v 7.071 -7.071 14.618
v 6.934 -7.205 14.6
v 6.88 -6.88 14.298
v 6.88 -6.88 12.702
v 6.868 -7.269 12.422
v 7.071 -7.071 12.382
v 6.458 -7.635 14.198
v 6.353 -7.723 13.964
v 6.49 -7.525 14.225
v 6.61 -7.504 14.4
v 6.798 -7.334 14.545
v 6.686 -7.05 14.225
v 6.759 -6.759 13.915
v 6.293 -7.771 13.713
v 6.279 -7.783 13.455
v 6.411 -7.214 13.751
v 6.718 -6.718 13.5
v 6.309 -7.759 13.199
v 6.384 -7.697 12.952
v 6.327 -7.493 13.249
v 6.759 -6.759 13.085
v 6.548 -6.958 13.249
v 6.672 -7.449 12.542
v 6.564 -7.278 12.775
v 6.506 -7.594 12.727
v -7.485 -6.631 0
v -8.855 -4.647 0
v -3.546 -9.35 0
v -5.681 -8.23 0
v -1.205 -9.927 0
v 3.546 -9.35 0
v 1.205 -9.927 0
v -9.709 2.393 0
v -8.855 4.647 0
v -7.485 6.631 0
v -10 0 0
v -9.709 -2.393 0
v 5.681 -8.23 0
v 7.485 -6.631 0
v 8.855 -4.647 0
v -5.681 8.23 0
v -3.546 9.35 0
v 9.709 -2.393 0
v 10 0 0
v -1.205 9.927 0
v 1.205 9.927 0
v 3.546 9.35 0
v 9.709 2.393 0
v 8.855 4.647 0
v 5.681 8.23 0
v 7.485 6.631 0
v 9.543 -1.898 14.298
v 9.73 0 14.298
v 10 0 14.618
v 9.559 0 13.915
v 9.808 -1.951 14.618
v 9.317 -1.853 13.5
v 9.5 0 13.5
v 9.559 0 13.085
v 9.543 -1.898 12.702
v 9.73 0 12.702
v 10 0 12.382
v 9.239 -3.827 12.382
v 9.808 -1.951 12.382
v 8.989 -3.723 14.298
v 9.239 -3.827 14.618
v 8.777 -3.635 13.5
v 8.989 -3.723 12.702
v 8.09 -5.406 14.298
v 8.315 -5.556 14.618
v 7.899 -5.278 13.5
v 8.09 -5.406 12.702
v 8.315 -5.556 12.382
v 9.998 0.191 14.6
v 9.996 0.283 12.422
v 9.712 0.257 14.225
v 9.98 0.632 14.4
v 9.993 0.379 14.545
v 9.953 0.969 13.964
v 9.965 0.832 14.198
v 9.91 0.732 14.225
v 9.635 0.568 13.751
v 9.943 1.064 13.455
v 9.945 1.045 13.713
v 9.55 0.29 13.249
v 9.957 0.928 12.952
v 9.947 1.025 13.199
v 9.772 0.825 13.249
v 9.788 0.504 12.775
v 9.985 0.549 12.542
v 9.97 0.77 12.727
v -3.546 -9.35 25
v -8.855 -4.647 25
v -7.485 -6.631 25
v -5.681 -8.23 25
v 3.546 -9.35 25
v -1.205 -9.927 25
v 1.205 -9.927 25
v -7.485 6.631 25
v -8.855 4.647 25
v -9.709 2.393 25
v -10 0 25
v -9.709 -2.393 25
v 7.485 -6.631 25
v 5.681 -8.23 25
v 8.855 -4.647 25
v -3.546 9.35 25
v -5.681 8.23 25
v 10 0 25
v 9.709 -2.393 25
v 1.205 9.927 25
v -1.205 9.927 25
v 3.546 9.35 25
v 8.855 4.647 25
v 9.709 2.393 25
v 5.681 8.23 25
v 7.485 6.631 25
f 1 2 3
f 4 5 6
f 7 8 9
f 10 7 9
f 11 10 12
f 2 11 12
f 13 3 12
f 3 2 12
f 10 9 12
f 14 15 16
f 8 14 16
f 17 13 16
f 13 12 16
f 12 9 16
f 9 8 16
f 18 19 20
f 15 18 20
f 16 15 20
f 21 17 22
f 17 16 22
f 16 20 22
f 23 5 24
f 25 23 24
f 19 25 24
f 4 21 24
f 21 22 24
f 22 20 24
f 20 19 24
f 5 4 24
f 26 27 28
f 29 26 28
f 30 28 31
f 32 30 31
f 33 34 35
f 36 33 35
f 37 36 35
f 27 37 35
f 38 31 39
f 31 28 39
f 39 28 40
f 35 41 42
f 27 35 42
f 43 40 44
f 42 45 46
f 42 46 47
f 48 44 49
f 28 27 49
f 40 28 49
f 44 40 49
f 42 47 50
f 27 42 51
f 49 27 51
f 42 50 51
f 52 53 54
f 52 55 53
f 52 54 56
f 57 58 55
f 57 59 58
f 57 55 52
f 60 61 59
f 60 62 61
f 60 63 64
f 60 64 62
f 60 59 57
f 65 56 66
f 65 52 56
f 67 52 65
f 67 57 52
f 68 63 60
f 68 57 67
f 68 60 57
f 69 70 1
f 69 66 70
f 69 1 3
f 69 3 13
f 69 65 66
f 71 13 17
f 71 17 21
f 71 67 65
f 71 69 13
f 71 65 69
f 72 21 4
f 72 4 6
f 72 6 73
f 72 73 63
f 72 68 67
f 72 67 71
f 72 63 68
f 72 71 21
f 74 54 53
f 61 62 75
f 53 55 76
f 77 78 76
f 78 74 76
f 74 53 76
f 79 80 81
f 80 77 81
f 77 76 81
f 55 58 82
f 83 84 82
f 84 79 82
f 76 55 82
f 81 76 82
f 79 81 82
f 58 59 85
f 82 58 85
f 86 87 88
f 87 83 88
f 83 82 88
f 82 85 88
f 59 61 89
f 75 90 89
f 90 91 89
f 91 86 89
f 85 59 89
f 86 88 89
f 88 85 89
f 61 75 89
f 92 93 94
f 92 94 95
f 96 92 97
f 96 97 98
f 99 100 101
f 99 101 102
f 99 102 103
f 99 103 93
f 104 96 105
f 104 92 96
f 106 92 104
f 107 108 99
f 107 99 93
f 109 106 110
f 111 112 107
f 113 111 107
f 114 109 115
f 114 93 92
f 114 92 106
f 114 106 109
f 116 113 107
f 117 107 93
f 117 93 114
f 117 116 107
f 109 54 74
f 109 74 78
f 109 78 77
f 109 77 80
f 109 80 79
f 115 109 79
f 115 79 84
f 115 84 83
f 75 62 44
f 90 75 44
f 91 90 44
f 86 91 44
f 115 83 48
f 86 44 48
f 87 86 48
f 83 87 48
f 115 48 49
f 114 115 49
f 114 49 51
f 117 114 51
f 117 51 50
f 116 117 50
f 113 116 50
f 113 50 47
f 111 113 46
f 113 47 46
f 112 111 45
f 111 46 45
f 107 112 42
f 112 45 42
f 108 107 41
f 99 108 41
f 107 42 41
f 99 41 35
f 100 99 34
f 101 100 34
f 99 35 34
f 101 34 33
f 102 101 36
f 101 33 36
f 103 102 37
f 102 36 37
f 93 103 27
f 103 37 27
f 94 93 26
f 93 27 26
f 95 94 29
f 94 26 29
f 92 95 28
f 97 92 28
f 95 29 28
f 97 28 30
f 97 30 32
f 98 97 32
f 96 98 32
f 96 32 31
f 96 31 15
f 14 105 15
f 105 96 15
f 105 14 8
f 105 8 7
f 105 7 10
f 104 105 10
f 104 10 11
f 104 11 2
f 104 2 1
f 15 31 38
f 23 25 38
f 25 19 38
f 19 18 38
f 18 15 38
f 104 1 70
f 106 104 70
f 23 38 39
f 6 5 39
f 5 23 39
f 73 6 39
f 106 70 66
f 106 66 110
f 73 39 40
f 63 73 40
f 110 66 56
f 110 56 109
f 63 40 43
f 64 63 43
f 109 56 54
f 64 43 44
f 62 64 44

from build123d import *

# Parameters (mm, degrees)
F0_R     = 10
F1_DEPTH = 25
F3_ANGLE = -45
F5_ANGLE = -45


with BuildPart() as f1:
    # F0 (on Top) → F1 (new body)
    with BuildSketch(Plane.XY):
        Circle(F0_R)
    extrude(amount=F1_DEPTH)

    # F2 (on Front) → F3 (revolve, cut)
    with BuildSketch(Plane.XZ):
        with BuildLine():
            Line((11, 12), (11, 15))
            ThreePointArc((11, 15), (9.5, 13.5), (11, 12))
        make_face()
    revolve(axis=Axis((0, 0, 25), (0, 0, 1)), revolution_arc=F3_ANGLE, mode=Mode.SUBTRACT)


with BuildPart() as f4:
    # F2 (on Front) → F4 (revolve)
    with BuildSketch(Plane.XZ):
        with BuildLine():
            Line((11, 12), (11, 15))
            ThreePointArc((11, 15), (9.5, 13.5), (11, 12))
        make_face()
    revolve(axis=Axis((11, 0, 13.5), (0, 0, -1)))


with BuildPart() as f5_1:
    # F5: copy of F4
    add(f4.part.rotate(Axis((0, 0, 25), (0, 0, 1)), F5_ANGLE))


with BuildPart() as f1_1:
    add(f1.part)

    # F6: cut F5_1, F4
    add(f5_1.part, mode=Mode.SUBTRACT)
    add(f4.part, mode=Mode.SUBTRACT)


solid = f1_1.part
